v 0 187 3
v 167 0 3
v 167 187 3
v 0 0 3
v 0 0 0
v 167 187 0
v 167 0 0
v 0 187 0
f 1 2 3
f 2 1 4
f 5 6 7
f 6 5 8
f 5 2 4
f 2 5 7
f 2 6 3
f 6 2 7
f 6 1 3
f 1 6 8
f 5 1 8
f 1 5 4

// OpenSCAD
//for apporopriate alignment of the grid
xoff = 17;
yoff = 17;
zoff = 2;
plat = 167;
scaleFac = 25.4;
t0 = "O";
t1 = "N";
t2 = "E";
t3 = "1";
f0 = "Letters/";
f1 = "Letters/";
f2 = "Letters/";
f3 = "Numbers/";
font = "_alpha.dxf";
braille = false;
//quadrant title offsets
qxoff = 30;
qyoff = 8;

//remove excess grid/plot
difference() {
	//align and union the grid and plot
	translate(v = [xoff, yoff, zoff]) { 
		union() {
			linear_extrude(file = "Grid/cleanGrid1.dxf", height = 3, center = false);
			if (braille) {
				linear_extrude(file = "Grid/gridNum.dxf", height = 5, center = false);
			} else { 
				linear_extrude(file = "Grid/gridNum_alpha.dxf", height = 5, center = false);
			}		
			scale(v = [scaleFac,scaleFac,0])linear_extrude(file = "Q.dxf", height = 5, center = false);
		}
	}

	//blocks to remove excess
	union() {
		translate(v=[-20,-10,0]) cube(size = [20,170,10], center=false);
		translate(v=[0,-20,0]) cube(size = [170,20,10], center=false);
	}
}
	

//grid platform
cube(size = [plat,plat+20,3], center = false);
//title bar
first = 10;
translate(v=[first,plat+qyoff,zoff]) linear_extrude(file = str(f0,t0,font), height = 5 , center = false);
translate(v=[first+15,plat+qyoff,zoff]) linear_extrude(file = str(f1,t1,font), height = 5 , center = false);
translate(v=[first+30,plat+qyoff,zoff]) linear_extrude(file = str(f2,t2,font), height = 5 , center = false);
translate(v=[first+45,plat+qyoff,zoff]) linear_extrude(file = str(f3,t3,font), height = 5 , center = false);
if (braille) {
	translate(v=[plat-qxoff,plat+qyoff,zoff]) linear_extrude(file = "Grid/one.dxf", height = 5 , center = false);		
} else {
	translate(v=[plat-qxoff,plat+qyoff,zoff]) linear_extrude(file = "Grid/one_alpha.dxf", height = 5 , center = false);		
}
